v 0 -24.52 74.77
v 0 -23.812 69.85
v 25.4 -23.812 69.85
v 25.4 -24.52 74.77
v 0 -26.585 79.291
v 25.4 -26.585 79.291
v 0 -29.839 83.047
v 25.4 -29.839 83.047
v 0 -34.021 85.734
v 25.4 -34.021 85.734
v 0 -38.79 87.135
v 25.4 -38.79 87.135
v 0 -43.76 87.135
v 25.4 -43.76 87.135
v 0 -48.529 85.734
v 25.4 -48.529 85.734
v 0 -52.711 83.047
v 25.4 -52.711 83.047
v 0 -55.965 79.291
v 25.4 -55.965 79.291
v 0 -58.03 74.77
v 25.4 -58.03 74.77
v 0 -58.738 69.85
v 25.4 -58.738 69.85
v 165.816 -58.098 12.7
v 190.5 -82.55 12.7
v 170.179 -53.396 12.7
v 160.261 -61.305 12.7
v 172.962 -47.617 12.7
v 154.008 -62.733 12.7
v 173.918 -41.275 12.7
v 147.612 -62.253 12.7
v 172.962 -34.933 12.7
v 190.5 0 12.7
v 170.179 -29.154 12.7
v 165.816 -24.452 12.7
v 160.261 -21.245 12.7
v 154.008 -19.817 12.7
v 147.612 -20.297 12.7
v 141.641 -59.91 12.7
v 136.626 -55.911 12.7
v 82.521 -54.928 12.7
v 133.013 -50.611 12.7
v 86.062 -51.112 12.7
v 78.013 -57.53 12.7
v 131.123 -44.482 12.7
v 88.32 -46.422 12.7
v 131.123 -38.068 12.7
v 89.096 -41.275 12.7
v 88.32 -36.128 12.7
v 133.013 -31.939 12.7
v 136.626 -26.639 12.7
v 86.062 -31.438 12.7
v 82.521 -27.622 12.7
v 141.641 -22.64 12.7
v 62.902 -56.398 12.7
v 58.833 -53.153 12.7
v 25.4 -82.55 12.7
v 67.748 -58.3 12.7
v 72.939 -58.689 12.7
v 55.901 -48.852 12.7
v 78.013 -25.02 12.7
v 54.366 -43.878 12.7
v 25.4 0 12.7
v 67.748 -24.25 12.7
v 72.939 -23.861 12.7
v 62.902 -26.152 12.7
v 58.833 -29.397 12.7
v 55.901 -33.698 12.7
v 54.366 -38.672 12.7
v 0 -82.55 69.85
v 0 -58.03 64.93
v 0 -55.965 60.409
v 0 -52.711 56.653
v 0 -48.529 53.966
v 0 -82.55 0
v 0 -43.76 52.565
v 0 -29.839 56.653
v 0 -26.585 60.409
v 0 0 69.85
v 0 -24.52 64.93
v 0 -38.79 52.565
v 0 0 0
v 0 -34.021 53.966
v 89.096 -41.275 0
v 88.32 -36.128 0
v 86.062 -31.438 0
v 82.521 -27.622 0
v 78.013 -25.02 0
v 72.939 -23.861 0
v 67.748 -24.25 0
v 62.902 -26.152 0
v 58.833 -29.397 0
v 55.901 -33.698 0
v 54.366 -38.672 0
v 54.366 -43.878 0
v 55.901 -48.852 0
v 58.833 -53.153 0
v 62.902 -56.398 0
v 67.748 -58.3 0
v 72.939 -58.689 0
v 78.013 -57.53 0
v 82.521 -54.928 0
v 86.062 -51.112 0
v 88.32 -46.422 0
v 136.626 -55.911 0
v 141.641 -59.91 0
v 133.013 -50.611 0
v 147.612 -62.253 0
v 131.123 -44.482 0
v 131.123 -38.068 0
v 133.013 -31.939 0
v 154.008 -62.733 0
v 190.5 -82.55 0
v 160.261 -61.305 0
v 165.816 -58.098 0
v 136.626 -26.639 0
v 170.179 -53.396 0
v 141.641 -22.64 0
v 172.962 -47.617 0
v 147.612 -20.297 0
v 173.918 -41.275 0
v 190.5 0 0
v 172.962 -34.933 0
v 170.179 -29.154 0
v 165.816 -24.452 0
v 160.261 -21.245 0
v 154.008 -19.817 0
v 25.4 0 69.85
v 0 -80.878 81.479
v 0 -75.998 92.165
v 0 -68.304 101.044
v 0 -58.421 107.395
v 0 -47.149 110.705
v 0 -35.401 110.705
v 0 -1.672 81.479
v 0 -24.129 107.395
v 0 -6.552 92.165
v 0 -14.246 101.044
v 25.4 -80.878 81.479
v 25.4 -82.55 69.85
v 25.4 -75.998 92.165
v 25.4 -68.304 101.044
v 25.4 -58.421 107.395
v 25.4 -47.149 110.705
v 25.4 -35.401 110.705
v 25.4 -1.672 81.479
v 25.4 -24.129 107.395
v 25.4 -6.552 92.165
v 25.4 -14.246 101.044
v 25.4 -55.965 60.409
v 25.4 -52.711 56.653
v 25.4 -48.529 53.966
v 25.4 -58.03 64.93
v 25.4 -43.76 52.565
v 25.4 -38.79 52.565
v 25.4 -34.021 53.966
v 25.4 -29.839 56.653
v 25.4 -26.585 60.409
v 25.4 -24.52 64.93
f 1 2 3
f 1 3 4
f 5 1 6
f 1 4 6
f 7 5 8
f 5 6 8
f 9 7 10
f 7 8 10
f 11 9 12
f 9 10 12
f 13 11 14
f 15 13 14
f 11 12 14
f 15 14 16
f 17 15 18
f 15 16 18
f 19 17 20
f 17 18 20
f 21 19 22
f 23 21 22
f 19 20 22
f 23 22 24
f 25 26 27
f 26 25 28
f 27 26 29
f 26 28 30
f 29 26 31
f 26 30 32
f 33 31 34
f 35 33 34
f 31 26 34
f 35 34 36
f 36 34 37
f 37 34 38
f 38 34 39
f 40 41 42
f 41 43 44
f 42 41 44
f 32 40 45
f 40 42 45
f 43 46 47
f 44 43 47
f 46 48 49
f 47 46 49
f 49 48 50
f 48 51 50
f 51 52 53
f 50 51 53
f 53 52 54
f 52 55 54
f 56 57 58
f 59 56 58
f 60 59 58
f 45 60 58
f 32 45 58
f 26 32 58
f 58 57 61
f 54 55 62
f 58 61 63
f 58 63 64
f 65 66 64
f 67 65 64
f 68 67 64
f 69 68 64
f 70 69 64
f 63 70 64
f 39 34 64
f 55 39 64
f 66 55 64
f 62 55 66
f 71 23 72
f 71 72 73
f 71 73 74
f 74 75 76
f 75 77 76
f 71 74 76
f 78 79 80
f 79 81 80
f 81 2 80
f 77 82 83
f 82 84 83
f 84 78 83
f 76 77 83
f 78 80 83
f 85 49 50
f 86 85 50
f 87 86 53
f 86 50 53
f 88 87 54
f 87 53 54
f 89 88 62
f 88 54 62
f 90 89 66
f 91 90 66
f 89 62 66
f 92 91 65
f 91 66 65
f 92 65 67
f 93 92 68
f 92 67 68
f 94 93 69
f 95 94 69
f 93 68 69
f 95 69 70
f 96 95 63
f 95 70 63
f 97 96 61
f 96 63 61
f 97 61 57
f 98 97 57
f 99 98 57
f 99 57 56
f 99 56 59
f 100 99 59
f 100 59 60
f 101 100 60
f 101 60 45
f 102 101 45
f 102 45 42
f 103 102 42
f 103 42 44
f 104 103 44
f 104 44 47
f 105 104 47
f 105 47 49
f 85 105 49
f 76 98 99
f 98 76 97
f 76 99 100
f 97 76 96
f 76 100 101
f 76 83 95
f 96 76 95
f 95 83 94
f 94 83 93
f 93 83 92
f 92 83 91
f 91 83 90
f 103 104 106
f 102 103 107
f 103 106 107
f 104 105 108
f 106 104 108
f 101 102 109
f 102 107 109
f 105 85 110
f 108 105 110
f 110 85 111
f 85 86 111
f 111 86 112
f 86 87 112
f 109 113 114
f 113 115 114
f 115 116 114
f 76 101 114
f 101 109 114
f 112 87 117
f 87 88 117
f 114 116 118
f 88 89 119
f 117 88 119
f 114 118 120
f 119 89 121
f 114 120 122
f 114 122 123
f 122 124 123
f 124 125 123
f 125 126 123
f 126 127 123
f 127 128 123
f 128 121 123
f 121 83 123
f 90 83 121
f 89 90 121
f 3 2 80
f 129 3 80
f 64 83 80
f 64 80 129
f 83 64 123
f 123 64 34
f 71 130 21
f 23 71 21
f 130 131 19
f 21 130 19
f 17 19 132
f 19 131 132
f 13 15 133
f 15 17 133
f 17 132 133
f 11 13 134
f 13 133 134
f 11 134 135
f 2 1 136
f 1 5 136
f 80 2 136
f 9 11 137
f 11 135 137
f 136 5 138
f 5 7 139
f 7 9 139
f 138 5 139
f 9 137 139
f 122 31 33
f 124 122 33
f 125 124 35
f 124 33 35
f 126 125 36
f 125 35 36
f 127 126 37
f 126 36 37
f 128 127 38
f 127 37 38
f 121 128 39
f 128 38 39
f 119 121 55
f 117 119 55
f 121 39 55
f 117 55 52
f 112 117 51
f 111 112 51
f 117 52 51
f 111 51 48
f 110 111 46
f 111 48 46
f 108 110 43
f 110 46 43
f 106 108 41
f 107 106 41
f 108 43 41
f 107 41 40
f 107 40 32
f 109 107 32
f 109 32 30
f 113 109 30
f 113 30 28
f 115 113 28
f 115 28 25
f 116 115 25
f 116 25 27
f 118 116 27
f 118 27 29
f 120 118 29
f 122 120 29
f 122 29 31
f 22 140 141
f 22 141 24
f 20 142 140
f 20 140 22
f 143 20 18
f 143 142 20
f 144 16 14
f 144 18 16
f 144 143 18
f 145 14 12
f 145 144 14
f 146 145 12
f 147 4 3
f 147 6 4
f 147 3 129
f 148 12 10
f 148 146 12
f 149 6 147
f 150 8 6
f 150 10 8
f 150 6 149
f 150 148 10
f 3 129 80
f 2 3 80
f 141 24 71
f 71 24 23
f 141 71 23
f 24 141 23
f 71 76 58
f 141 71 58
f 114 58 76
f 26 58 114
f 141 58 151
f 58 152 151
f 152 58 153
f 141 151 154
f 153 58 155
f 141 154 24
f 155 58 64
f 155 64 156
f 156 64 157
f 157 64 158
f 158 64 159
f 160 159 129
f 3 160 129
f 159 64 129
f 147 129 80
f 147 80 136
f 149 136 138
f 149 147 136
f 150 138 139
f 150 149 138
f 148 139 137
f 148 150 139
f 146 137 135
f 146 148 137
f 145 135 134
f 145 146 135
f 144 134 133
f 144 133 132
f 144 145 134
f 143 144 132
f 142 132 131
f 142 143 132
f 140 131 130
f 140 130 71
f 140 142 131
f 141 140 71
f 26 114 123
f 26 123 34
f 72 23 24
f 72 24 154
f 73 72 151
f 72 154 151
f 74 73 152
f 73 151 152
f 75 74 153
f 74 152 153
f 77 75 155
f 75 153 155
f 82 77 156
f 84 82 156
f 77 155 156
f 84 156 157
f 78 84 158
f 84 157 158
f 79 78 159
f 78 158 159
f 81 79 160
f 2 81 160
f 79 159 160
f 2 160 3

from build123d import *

# Parameters (mm, degrees)
F1_DEPTH = 82.55
F3_DEPTH = 25.4
F4_R     = 21.5178253772
F4_R_2   = 17.4625
F5_DEPTH = 25.4
F7_DEPTH = 25.4
F9_DEPTH = 25.4


with BuildPart() as f1:
    # F0 (on Front) → F1 (new body)
    with BuildSketch(Plane.XZ):
        Polygon((0, 69.85), (0, 0), (190.5, 0), (190.5, 12.7), (25.4, 12.7), (25.4, 69.85), align=None)
    extrude(amount=F1_DEPTH)

    # F4 (on face) → F5 (cut)
    with BuildSketch(Plane.XY.offset(12.7)):
        with Locations((152.4, -41.275)):
            Circle(F4_R)
        with Locations((71.6337114573, -41.275)):
            Circle(F4_R_2)
    extrude(amount=-F5_DEPTH, mode=Mode.SUBTRACT)

    # F6 (on face) → F7 (cut)
    with BuildSketch(Plane.YZ.offset(25.4)):
        with BuildLine():
            ThreePointArc((-58.7375, 69.85), (-41.275, 52.3875), (-23.8125, 69.85))
            Line((-23.8125, 69.85), (-58.7375, 69.85))
        make_face()
    extrude(amount=-F7_DEPTH, mode=Mode.SUBTRACT)


with BuildPart() as f3:
    # F2 (on face) → F3 (new body)
    with BuildSketch(Plane.YZ.offset(25.4)):
        with BuildLine():
            Line((-82.55, 69.85), (0, 69.85))
            ThreePointArc((0, 69.85), (-41.275, 111.125), (-82.55, 69.85))
        make_face()
    extrude(amount=-F3_DEPTH)

    # F8 (on face) → F9 (cut)
    with BuildSketch(Plane.YZ.offset(25.4)):
        with BuildLine():
            Line((-58.7375, 69.85), (-23.8125, 69.85))
            ThreePointArc((-23.8125, 69.85), (-41.275, 87.3125), (-58.7375, 69.85))
        make_face()
    extrude(amount=-F9_DEPTH, mode=Mode.SUBTRACT)


solid = Compound([f1.part, f3.part])
